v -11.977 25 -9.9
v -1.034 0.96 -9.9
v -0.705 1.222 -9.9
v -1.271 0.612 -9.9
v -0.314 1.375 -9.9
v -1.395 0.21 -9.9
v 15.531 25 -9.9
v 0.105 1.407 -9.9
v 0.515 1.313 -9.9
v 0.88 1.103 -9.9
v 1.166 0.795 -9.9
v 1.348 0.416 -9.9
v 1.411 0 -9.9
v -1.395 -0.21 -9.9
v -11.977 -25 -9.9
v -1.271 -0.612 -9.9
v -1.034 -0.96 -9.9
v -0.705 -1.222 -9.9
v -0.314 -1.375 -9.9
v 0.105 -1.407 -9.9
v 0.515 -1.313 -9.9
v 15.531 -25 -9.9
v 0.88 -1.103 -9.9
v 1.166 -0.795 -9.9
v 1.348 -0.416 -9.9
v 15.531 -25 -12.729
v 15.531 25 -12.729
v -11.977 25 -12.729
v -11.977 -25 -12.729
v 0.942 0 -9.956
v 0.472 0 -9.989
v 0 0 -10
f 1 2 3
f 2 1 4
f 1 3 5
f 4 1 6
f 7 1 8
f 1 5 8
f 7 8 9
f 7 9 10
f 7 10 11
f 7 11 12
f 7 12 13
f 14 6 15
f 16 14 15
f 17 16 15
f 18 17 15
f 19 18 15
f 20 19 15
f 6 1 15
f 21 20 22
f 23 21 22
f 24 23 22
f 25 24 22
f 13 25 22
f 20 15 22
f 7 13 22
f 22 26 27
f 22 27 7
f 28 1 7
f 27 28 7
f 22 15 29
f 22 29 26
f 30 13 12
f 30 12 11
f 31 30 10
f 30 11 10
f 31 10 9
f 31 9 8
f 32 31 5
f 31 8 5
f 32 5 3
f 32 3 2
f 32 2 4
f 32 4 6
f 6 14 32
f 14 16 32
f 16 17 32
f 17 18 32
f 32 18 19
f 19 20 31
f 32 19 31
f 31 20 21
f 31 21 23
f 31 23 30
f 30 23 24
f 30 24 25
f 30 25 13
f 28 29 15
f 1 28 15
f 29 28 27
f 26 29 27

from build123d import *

# Parameters (mm, degrees)
F3_W     = 27.507902
F3_H     = 2.828666
F4_DEPTH = 50


with BuildPart() as f1:
    # F0 (on Front) → F1 (revolve)
    with BuildSketch(Plane.XZ):
        with BuildLine():
            Line((0, 10), (0, -10))
            ThreePointArc((0, -10), (10, 0), (0, 10))
        make_face()
    revolve(axis=Axis((0, 0, 0), (0, 0, 1)))


with BuildPart() as f4:
    # F3 (on offset) → F4 (new body)
    with BuildSketch(Plane.XZ.offset(25)):
        with Locations((1.777139, -11.314333)):
            Rectangle(F3_W, F3_H)
    extrude(amount=-F4_DEPTH)

    # F5: cut F1
    add(f1.part, mode=Mode.SUBTRACT)


solid = f4.part
